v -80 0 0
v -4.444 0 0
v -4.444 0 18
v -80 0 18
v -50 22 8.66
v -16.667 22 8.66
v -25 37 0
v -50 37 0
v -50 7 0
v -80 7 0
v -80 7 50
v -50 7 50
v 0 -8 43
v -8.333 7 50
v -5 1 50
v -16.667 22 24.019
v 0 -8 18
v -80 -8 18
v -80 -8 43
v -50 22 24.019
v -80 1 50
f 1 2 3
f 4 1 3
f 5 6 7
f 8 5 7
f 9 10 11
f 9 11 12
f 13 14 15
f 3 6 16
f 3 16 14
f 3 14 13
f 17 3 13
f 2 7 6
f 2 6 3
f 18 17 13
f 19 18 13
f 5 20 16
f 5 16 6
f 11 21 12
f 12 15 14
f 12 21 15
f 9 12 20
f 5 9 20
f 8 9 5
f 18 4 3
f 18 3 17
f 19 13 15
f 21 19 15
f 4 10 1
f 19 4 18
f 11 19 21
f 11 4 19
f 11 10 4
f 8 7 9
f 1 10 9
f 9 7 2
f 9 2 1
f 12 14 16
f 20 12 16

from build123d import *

# Parameters (mm, degrees)
RESSALTO_EXTRUS_O1_DEPTH          = 80
CORTE_EXTRUS_O2_REACH             = 103.336
ESBO_O2_W                         = 30
ESBO_O2_H                         = 30
CORTE_EXTRUS_O2_DIRECTION_2_DEPTH = 102.336074524
CORTE_EXTRUS_O3_REACH             = 103.336


with BuildPart() as part:
    # Esboço1 → Ressalto-extrusão1 (new body)
    with BuildSketch(Plane(origin=(0, 0, 0), x_dir=(0, 0, -1), z_dir=(1, 0, 0))):
        Polygon((-50, 7), (-24.019237886, 22), (-8.660254038, 22), (0, 37), (0, 0), (-18, 0), (-18, -8), (-43, -8), (-50, 1), align=None)
    extrude(amount=-RESSALTO_EXTRUS_O1_DEPTH)

    # Esboço2 → Corte-extrusão2 (cut, up to next)
    with BuildSketch(Plane.XY, mode=Mode.PRIVATE) as corte_extrus_o2_sk1:
        with Locations((-65, 22)):
            Rectangle(ESBO_O2_W, ESBO_O2_H)
    corte_extrus_o2_tool1 = extrude(corte_extrus_o2_sk1.sketch, amount=CORTE_EXTRUS_O2_REACH, mode=Mode.PRIVATE) & part.part
    add(corte_extrus_o2_tool1.solids().sort_by_distance((-65, 22, 0))[0], mode=Mode.SUBTRACT)

    # Esboço2 → Corte-extrusão2 direction 2 (cut)
    with BuildSketch(Plane.XY):
        with Locations((-65, 22)):
            Rectangle(ESBO_O2_W, ESBO_O2_H)
    extrude(amount=-CORTE_EXTRUS_O2_DIRECTION_2_DEPTH, mode=Mode.SUBTRACT)

    # Esboço3 → Corte-extrusão3 (cut, up to next)
    with BuildSketch(Plane.XY, mode=Mode.PRIVATE) as corte_extrus_o3_sk1:
        Polygon((-25, 37), (0, -8), (0, 37), align=None)
    corte_extrus_o3_tool1 = extrude(corte_extrus_o3_sk1.sketch, amount=CORTE_EXTRUS_O3_REACH, mode=Mode.PRIVATE) & part.part
    add(corte_extrus_o3_tool1.solids().sort_by_distance((-8.333333, 22, 0))[0], mode=Mode.SUBTRACT)


solid = part.part
